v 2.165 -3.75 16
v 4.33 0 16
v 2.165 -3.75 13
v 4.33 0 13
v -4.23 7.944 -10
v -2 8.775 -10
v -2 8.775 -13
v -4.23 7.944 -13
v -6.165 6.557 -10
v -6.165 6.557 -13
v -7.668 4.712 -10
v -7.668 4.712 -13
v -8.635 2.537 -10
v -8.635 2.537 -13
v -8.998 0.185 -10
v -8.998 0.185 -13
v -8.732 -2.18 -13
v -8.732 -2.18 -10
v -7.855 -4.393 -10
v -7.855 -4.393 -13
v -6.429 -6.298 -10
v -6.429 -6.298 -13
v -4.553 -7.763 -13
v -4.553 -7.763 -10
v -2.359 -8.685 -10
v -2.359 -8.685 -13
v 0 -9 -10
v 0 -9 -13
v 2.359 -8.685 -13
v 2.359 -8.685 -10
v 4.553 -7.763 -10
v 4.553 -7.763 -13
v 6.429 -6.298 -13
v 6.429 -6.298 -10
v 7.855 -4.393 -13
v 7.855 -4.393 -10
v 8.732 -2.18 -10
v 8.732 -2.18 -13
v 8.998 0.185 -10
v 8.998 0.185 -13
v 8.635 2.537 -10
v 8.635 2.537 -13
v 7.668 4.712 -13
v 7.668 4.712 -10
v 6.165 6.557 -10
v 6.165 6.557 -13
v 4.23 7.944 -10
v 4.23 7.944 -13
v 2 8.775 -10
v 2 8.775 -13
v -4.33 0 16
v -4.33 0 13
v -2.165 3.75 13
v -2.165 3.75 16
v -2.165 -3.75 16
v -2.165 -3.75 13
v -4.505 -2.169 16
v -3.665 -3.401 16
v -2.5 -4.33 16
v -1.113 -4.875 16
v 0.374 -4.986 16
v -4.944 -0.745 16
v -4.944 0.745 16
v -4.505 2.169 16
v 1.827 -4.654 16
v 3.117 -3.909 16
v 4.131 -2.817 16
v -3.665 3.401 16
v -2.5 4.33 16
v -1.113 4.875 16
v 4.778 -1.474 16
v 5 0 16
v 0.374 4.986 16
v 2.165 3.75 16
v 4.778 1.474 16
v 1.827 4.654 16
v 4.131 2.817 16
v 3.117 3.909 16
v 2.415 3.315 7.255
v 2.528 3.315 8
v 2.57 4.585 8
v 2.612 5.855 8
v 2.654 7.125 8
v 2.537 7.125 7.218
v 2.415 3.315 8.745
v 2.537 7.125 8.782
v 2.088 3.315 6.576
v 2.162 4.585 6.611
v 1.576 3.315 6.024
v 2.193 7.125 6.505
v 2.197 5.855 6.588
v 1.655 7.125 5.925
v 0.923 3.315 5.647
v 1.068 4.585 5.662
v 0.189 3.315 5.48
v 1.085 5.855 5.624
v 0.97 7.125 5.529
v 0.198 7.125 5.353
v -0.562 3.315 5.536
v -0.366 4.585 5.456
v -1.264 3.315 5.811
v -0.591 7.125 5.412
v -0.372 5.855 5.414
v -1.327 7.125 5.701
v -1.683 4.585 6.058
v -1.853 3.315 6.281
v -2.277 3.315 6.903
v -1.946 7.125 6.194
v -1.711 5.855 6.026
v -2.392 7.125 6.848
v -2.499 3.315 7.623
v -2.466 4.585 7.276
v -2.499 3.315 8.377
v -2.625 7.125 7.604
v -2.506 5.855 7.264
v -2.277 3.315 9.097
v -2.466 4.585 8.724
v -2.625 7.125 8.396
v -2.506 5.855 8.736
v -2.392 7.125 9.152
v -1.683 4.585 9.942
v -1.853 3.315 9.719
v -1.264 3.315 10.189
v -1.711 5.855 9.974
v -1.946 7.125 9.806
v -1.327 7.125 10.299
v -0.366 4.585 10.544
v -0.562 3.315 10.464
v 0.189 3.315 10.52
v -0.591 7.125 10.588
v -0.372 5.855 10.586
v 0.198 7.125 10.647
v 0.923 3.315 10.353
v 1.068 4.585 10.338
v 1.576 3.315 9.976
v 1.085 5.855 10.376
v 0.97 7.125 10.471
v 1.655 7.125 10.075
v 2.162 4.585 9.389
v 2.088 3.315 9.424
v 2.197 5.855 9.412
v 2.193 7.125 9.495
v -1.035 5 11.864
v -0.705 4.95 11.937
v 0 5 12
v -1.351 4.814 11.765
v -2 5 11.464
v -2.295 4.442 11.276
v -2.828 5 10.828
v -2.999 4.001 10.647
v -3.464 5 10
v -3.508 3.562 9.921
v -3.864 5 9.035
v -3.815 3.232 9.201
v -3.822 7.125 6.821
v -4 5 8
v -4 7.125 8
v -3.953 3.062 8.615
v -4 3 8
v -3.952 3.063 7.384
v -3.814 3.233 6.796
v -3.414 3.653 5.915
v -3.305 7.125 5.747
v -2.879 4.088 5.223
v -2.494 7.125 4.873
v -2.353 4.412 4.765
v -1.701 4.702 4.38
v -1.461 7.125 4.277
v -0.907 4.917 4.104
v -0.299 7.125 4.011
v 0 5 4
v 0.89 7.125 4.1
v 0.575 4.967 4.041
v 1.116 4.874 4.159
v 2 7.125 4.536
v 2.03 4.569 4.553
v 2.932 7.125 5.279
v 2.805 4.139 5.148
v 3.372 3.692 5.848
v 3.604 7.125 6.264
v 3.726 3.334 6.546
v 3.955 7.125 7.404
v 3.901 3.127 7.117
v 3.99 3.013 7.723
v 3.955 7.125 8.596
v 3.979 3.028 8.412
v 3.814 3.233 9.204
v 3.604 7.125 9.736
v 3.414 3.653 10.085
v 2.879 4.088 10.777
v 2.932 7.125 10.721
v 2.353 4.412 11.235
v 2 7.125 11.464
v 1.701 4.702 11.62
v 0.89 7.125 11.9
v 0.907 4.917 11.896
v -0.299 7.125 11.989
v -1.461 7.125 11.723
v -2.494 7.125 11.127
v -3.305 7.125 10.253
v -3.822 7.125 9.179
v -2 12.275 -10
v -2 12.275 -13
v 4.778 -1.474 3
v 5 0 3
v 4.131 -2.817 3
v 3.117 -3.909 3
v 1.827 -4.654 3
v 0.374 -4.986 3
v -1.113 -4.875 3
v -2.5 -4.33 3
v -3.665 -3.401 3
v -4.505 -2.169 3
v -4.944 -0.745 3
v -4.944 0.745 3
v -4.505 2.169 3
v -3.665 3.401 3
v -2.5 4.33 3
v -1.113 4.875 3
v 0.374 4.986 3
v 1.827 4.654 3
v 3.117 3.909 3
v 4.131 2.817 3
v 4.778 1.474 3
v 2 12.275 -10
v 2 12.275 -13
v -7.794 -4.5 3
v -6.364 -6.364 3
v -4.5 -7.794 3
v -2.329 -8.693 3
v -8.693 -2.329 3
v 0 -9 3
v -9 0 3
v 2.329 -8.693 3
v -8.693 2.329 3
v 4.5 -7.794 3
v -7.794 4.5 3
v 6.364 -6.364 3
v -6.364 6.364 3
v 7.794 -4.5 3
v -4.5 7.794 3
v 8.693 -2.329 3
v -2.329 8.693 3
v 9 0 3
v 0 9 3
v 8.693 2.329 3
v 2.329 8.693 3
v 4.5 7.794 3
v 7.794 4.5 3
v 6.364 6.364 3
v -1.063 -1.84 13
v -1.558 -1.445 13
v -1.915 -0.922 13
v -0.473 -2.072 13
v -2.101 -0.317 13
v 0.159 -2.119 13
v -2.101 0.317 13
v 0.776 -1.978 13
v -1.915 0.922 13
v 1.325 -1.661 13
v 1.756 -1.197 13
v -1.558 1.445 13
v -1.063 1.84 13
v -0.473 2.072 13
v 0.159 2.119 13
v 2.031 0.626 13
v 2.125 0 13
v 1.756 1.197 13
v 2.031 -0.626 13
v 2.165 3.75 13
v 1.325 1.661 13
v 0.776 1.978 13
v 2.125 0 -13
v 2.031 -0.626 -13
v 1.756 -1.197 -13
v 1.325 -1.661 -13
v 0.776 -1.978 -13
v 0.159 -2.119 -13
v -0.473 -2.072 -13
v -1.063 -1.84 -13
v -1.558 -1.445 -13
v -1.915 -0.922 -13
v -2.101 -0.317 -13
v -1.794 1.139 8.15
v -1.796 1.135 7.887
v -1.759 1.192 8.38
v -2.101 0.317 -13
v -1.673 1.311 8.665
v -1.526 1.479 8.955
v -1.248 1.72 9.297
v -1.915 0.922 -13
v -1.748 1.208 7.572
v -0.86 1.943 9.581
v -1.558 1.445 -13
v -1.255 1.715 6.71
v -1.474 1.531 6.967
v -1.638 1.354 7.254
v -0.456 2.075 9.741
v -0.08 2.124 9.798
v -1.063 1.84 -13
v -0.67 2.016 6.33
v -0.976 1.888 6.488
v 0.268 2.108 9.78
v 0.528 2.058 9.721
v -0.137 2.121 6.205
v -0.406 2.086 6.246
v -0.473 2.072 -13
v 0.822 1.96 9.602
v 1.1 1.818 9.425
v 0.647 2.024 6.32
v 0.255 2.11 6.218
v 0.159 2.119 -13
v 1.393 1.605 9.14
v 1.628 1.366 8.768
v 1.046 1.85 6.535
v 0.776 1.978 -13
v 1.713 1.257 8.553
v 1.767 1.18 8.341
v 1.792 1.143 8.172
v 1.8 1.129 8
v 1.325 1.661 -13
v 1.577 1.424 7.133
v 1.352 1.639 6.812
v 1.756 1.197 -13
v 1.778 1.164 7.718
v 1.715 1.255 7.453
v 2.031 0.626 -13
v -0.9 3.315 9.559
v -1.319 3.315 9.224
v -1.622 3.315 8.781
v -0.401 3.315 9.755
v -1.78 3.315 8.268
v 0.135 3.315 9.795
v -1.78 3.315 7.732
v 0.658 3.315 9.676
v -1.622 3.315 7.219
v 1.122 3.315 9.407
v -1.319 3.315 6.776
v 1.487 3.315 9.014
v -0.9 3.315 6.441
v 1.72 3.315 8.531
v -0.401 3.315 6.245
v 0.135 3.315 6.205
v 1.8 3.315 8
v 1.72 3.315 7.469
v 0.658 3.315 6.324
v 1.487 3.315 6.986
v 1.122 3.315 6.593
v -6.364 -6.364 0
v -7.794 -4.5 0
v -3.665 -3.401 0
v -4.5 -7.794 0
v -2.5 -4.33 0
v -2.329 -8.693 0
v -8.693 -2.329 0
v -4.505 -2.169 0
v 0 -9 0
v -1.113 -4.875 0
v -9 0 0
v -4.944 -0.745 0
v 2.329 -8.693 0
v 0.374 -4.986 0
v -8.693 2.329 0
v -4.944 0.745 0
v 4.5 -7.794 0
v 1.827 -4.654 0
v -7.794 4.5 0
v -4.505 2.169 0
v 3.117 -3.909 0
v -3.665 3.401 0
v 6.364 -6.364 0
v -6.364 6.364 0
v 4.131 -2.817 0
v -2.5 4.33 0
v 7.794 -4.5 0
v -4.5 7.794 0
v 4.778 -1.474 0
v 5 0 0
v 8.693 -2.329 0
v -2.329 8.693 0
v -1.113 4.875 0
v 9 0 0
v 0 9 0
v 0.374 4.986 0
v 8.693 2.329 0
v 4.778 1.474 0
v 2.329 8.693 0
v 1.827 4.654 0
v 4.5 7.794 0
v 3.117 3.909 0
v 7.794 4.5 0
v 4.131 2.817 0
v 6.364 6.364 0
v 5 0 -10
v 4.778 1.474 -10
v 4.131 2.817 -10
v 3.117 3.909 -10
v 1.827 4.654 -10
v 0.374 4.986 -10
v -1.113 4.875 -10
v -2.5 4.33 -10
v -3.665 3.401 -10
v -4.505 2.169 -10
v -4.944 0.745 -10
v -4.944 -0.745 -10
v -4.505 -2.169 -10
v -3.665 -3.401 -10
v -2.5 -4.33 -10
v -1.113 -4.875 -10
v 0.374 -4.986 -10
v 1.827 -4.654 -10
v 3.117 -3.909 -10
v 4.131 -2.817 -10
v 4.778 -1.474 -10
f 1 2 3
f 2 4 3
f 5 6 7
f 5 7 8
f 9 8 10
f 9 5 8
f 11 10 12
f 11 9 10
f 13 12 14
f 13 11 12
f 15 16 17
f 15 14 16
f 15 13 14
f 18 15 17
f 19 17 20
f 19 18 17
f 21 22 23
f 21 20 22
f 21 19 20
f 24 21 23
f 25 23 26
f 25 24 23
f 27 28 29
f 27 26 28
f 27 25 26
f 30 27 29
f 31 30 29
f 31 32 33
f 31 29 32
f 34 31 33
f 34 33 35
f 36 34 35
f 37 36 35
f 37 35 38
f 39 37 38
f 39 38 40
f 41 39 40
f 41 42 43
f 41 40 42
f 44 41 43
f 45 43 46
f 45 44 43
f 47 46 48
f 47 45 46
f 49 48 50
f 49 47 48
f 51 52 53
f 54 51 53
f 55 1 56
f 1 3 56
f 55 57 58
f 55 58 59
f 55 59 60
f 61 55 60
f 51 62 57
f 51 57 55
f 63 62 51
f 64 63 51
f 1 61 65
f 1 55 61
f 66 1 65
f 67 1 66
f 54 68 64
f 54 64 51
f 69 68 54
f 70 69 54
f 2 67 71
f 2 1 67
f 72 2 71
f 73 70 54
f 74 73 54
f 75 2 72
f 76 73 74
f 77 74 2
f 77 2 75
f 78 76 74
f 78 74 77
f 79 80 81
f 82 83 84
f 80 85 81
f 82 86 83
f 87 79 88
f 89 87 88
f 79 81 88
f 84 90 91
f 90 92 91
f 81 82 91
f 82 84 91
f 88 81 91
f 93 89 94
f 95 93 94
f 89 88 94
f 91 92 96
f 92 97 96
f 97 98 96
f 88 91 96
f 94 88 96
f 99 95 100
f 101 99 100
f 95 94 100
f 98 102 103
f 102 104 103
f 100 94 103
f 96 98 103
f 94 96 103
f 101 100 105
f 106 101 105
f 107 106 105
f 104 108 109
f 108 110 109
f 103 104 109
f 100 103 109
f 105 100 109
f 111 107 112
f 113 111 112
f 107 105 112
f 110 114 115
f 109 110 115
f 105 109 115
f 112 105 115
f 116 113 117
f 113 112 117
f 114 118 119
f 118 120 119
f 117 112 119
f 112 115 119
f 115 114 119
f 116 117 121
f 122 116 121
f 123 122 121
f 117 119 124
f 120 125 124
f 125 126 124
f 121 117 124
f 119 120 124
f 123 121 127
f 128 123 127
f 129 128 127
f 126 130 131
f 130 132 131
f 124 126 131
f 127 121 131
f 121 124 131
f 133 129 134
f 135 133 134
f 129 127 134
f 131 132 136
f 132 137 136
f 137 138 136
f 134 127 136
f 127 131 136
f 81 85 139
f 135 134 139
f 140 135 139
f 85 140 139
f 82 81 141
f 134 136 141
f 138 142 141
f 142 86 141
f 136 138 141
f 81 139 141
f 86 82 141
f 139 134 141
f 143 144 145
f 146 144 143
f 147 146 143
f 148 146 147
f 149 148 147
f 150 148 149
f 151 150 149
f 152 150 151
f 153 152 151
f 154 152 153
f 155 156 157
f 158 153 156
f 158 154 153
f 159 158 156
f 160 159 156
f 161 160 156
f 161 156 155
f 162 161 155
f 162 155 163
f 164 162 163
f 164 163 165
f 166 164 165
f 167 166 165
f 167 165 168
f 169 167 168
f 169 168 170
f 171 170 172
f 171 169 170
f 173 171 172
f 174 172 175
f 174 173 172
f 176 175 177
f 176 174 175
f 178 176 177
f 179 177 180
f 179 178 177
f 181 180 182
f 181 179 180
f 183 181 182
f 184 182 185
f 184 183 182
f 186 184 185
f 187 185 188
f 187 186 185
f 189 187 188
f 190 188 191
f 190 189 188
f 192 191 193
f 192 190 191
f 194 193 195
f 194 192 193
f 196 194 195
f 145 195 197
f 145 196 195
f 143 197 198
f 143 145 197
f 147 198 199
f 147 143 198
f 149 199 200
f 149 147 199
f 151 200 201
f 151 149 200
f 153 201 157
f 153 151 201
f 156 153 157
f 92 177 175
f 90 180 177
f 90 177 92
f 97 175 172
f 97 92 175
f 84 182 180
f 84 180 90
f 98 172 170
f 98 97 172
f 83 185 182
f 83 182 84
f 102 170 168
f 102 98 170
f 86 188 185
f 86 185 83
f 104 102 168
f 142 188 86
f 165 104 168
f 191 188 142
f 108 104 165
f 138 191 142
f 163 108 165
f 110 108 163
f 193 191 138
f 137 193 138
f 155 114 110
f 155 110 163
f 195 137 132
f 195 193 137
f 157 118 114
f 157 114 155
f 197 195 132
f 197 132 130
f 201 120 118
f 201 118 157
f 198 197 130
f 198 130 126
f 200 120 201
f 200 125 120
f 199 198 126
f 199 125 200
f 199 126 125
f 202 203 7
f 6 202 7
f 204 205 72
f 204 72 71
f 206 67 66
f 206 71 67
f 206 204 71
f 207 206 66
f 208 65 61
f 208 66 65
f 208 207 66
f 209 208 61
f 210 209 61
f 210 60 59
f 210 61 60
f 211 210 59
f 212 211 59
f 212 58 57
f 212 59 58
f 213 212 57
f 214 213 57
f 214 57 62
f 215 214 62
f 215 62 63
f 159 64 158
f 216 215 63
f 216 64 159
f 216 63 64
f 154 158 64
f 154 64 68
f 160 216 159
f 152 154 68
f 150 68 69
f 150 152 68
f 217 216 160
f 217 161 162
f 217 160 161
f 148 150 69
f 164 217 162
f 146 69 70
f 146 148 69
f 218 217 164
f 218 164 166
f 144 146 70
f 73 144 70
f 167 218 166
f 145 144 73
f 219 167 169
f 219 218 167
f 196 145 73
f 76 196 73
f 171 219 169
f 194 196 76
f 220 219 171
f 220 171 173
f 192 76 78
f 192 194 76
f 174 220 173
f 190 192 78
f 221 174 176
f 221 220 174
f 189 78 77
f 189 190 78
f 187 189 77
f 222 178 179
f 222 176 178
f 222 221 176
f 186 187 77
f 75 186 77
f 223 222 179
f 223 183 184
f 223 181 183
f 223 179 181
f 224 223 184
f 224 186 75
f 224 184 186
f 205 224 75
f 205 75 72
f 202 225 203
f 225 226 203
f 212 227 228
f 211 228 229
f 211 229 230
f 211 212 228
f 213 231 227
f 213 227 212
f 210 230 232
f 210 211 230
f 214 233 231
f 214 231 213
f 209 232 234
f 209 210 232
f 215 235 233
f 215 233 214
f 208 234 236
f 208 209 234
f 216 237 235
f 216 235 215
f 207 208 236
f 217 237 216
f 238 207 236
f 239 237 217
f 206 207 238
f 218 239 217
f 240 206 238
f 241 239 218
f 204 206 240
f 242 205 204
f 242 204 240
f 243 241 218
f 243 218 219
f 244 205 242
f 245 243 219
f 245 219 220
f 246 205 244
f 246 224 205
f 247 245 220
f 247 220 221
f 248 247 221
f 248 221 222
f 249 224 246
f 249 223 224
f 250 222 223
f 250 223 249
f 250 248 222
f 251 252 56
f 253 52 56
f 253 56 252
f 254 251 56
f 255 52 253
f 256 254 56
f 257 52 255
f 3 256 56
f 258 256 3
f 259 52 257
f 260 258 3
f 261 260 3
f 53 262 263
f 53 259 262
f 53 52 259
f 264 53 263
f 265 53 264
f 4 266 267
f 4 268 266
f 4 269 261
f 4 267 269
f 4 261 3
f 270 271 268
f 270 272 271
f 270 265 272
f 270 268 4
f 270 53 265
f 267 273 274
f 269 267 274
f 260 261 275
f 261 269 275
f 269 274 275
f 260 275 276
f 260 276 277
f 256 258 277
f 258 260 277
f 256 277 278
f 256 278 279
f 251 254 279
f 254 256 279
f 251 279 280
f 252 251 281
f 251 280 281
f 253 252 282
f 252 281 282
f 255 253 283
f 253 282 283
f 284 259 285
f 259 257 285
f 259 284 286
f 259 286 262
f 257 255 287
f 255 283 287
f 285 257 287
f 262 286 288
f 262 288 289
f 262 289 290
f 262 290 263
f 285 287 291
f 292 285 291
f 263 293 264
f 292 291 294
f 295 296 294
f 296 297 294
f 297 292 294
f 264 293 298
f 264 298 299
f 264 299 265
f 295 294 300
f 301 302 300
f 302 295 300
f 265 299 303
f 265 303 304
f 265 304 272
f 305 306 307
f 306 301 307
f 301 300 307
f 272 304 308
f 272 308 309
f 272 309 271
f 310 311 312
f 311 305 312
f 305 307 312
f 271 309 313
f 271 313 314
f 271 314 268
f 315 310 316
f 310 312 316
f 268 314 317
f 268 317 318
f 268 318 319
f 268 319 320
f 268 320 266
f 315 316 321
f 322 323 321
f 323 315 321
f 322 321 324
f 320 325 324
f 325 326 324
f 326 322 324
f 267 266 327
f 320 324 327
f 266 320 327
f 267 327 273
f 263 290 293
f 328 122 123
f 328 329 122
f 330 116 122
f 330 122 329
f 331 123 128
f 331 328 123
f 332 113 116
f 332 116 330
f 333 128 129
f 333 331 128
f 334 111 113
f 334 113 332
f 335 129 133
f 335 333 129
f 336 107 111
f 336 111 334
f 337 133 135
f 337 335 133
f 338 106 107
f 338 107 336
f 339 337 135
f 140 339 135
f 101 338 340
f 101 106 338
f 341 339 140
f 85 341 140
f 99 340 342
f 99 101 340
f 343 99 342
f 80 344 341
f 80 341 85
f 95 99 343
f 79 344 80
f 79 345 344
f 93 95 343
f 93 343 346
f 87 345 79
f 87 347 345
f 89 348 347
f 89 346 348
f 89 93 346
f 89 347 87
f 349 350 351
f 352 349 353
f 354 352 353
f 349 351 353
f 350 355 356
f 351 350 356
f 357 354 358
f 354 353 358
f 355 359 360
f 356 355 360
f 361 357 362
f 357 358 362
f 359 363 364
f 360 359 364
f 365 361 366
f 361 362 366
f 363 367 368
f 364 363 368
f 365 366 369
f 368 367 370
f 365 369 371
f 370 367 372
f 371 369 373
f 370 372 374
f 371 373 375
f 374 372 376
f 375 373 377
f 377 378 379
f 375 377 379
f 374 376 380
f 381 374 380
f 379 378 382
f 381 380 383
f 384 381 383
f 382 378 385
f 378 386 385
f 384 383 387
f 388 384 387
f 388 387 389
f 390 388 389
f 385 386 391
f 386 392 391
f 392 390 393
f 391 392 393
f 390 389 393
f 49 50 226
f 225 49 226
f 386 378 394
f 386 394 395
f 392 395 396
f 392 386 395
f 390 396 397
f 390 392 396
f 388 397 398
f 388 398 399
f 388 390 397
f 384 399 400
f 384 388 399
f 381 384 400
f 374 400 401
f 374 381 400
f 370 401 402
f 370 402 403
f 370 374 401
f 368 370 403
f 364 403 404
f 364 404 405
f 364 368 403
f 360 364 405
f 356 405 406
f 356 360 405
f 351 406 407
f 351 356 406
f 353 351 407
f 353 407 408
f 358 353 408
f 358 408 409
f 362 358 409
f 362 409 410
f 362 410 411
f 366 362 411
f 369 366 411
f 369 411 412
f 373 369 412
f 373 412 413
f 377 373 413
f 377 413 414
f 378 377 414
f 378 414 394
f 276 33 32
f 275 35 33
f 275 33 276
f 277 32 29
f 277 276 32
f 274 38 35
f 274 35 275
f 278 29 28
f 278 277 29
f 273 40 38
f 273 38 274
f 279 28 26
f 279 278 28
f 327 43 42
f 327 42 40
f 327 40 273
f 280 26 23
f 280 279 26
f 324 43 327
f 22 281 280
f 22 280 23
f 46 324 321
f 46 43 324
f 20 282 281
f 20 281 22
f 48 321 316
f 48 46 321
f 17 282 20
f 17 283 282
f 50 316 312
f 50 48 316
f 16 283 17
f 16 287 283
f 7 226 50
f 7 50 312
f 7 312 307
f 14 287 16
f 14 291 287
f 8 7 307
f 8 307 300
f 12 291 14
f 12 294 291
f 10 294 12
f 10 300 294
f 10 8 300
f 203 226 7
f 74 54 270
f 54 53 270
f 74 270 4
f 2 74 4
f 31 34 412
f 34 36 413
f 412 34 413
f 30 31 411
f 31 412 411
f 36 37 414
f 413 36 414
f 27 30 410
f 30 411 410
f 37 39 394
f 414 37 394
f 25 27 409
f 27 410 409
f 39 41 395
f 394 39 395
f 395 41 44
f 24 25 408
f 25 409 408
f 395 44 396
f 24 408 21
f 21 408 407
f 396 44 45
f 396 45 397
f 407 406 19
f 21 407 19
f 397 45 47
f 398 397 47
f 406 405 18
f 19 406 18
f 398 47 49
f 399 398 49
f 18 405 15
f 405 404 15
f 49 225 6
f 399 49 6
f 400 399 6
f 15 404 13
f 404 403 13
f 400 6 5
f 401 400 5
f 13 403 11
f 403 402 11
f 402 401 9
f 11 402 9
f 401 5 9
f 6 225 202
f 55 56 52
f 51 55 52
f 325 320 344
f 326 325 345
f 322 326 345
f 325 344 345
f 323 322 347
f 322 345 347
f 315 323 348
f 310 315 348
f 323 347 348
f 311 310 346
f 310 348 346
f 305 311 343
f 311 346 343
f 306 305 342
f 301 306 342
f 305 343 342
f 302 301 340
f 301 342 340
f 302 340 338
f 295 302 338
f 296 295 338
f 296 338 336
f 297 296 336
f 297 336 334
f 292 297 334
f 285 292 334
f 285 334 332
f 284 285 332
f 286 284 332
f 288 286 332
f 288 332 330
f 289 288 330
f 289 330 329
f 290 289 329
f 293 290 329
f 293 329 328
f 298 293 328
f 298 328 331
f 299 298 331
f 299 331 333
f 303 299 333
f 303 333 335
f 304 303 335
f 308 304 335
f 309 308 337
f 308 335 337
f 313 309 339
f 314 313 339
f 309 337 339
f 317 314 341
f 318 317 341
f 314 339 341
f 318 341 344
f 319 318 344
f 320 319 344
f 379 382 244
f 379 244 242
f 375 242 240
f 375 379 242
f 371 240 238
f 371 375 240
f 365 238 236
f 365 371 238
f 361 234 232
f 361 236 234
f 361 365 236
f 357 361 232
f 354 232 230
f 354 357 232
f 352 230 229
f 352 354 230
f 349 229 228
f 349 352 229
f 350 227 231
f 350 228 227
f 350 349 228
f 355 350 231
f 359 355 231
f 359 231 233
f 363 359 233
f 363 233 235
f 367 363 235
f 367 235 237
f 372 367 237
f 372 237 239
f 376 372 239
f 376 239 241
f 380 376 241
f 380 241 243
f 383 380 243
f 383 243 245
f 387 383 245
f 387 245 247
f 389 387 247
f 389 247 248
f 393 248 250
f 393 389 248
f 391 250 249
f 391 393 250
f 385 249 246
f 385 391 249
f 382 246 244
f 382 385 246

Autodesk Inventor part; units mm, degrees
ref_plane "YZ Plane" through (0, 0, 0) normal (1, 0, 0) x (0, 1, 0)
ref_plane "XZ Plane" through (0, 0, 0) normal (0, 1, 0) x (-1, 0, 0)
ref_plane "XY Plane" through (0, 0, 0) normal (0, 0, 1) x (1, 0, 0)
sketch "Sketch1" plane through (0, 0, 0) normal (0, 0, 1) x (1, 0, 0)
  circle A0 centre (0, 0) radius 5
  circle A1 centre (0, 0) radius 9
  circle A2 centre (0, 0) radius 2.125
  dimension "d0" = 10
  dimension "d1" = 18
  dimension "d2" = 4.25
extrude "Extrusion1" add sketch "Sketch1" against normal blind 10 contours A0 | A2
extrude "Extrusion2" add sketch "Sketch1" along normal blind 3 contours A0 | A1 | A2
sketch "Sketch2" plane through (0, 0, -10) normal (0, 0, -1) x (-1, 0, 0)
  circle A0 centre (0, 0) radius 9 projected
extrude "Extrusion3" add sketch "Sketch2" along normal blind 3
sketch "Sketch3" plane through (0, 0, 3) normal (0, 0, 1) x (1, 0, 0)
  circle A0 centre (0, 0) radius 5 projected
  circle A1 centre (0, 0) radius 2.125
  dimension "d9" = 4.25
extrude "Extrusion4" add sketch "Sketch3" along normal blind 10
ref_plane "Work Plane1" through (0, 0, -5) normal (0, 0, 1) x (1, 0, 0)
sketch "Sketch4" plane through (0, 0, -5) normal (0, 0, 1) x (1, 0, 0)
  circle A0 centre (0, 0) radius 5 projected
  arc A1 (1.5, 4.7697) -> (-1.5, 4.7697) centre (0, 0) ccw
  line L0 (0, 0) -> (0, 5) construction
  line L1 (-1.5, 4.7697) -> (-1.5, 9.7697)
  line L2 (-1.5, 9.7697) -> (1.5, 9.7697)
  line L3 (1.5, 9.7697) -> (1.5, 4.7697)
  dimension "d12" = 5
  dimension "d13" = 3
ref_plane "Work Plane2" through (0, 5, 2) normal (0, 1, 0) x (-1, 0, 0)
sketch "Sketch5" plane through (0, 5, 2) normal (0, 1, 0) x (-1, 0, 0)
  line L0 (5, 11) -> (-5, 11) projected
  line L1 (-5, 1) -> (5, 1) projected
  line L2 (-5, 11) -> (5, 1) construction
  line L3 (5, 11) -> (-5, 1) construction
  point P0 (0, -2)
  point P1 (0, 6)
extrude "Extrusion6" cut sketch "Sketch3" against normal up to surface (16 mm away) contours A1
sketch "Sketch6" plane through (0, 5, 2) normal (0, 1, 0) x (-1, 0, 0)
  line L0 (5, 11) -> (-5, 1) construction
  line L1 (-5, 11) -> (5, 1) construction
  circle A0 centre (0, 6) radius 4
  point P0 (0, -2)
  dimension "d18" = 8
extrude "Extrusion7" add sketch "Sketch6" against normal up to surface
extrude "Extrusion8" add sketch "Sketch6" along normal blind 2.125
sketch "Sketch7" plane through (0, 7.125, 8) normal (0, 1, 0) x (1, 0, 0)
  line L0 (5, -5) -> (-5, 5) construction
  line L1 (-5, -5) -> (5, 5) construction
  circle A0 centre (0, 0) radius 4 projected
  circle A1 centre (0, 0) radius 2.5275
  point P0 (0, 8)
  dimension "d23" = 5.055
extrude "Extrusion9" cut sketch "Sketch7" against normal blind 3.81 contours A1
sketch "Sketch8" plane through (0, 7.125, 8) normal (0, 1, 0) x (1, 0, 0)
  line L0 (-5, -5) -> (5, 5) construction
  line L1 (5, -5) -> (-5, 5) construction
  circle A0 centre (0, 0) radius 2.6545
  point P0 (0, 8)
  dimension "d26" = 5.309
loft "Loft1" cut profiles "Sketch8" section 1 edges at (-2.5275, 3.315, 8)
sketch "Sketch9" plane through (0, 3.315, 8) normal (0, 1, 0) x (1, 0, 0)
  line L0 (-5, -5) -> (5, 5) construction
  line L1 (5, -5) -> (-5, 5) construction
  circle A0 centre (0, 0) radius 1.8
  point P0 (0, 8)
  dimension "d31" = 3.6
extrude "Extrusion10" cut sketch "Sketch9" against normal up to surface
sketch "Sketch10" plane through (0, 0, -13) normal (0, 0, -1) x (-1, 0, 0)
  circle A0 centre (0, 0) radius 2.125 projected
  circle A1 centre (0, 0) radius 9 projected
  line L0 (0, 0) -> (0, 9) construction
  line L1 (-2, 8.775) -> (-2, 12.275)
  line L2 (-2, 12.275) -> (2, 12.275)
  line L3 (2, 12.275) -> (2, 8.775)
  arc A2 (2, 8.775) -> (-2, 8.775) centre (0, 0) ccw
  dimension "d34" = 3.5
  dimension "d35" = 4
extrude "Extrusion11" add sketch "Sketch10" against normal up to surface (3 mm away) contours A1 L1 L2 L3
sketch "Sketch12" plane through (0, 0, 13) normal (0, 0, 1) x (1, 0, 0)
  line L0 (2.1651, -3.75) -> (-2.1651, -3.75)
  line L1 (-2.1651, -3.75) -> (-4.3301, 0)
  line L2 (-4.3301, 0) -> (-2.1651, 3.75)
  line L3 (-2.1651, 3.75) -> (2.1651, 3.75)
  line L4 (2.1651, 3.75) -> (4.3301, 0)
  line L5 (4.3301, 0) -> (2.1651, -3.75)
  circle A0 centre (0, 0) radius 5 projected
  line L6 (0, 0) -> (0, -5) construction
  circle A1 centre (0, 0) radius 5
  point P0 (0, 5)
  dimension "d39" = 7.5
extrude "Extrusion12" add sketch "Sketch12" along normal blind 3
properties part number "stationarySpindle"
